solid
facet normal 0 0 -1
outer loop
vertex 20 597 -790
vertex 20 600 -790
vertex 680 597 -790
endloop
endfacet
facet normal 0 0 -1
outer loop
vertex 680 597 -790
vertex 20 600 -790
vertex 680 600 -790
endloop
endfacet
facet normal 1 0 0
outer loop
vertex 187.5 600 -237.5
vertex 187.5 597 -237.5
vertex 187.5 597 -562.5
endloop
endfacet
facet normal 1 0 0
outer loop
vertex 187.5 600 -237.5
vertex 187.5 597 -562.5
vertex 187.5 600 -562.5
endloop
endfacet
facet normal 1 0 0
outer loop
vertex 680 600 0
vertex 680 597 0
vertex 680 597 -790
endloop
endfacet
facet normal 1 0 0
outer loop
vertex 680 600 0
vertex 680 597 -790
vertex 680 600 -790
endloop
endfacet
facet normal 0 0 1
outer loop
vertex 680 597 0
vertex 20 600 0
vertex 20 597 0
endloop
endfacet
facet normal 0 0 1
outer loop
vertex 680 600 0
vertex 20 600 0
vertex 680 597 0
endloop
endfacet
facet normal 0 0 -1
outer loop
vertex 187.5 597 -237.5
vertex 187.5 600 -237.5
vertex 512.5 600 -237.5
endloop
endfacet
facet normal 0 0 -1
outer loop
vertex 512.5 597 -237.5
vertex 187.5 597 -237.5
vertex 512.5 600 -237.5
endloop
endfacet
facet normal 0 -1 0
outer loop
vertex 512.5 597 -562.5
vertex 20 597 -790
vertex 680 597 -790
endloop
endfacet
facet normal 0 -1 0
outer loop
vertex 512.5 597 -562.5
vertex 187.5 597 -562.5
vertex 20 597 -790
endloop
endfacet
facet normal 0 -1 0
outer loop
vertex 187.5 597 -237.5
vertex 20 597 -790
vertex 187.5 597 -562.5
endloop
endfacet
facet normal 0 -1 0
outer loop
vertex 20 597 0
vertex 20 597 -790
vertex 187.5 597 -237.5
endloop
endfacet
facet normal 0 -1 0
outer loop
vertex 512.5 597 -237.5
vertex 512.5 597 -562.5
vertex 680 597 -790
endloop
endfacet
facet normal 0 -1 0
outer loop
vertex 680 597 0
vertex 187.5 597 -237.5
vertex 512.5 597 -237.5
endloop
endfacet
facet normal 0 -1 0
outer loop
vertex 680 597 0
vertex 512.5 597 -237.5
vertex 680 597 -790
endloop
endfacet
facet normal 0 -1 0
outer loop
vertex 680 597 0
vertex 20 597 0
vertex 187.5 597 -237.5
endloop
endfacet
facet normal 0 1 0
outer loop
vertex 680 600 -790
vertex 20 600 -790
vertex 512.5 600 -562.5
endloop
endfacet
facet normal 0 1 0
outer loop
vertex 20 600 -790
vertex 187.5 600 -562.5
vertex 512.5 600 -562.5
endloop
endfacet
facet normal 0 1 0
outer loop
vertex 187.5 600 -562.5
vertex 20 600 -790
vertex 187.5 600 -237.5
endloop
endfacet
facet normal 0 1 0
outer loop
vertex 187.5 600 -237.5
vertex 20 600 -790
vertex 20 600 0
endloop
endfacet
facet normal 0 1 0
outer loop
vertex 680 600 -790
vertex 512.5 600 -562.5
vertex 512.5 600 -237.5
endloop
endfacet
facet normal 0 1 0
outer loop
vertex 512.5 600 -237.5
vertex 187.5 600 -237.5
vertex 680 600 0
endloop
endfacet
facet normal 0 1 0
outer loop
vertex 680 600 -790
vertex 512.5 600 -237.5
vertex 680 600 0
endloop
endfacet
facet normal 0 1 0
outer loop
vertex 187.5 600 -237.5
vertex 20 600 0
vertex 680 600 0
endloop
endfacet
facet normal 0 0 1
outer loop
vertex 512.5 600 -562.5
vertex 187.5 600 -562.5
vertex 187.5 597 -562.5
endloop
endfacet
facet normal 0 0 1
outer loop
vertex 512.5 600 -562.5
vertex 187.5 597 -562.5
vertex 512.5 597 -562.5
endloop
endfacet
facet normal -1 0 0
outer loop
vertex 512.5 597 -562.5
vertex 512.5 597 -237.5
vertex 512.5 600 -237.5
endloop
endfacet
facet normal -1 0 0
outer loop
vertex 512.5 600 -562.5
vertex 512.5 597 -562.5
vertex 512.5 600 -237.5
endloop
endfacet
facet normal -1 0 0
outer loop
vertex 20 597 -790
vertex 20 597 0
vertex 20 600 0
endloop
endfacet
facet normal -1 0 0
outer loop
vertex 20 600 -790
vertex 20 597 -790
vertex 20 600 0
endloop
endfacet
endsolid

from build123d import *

# Parameters (mm, degrees)
SKETCH1_W                            = 660
SKETCH1_H                            = 3
PACK_KALIP_PLAKASI_3MM_66X79_1_DEPTH = 790
PACK_KALIP_PLAKASI_3MM_66X79_2_START = -237.5
SKETCH2_W                            = 325
SKETCH2_H                            = 5
PACK_KALIP_PLAKASI_3MM_66X79_2_DEPTH = 325


with BuildPart() as part:
    # Sketch1 → PACK_kalip_plakasi_3mm_66x79_1 (new body)
    with BuildSketch(Plane.XY):
        with Locations((350, 598.5)):
            Rectangle(SKETCH1_W, SKETCH1_H)
    extrude(amount=-PACK_KALIP_PLAKASI_3MM_66X79_1_DEPTH)

    # Sketch2 → PACK_kalip_plakasi_3mm_66x79_2 (cut)
    with BuildSketch(Plane.XY.offset(PACK_KALIP_PLAKASI_3MM_66X79_2_START)):
        with Locations((350, 598.5)):
            Rectangle(SKETCH2_W, SKETCH2_H)
    extrude(amount=-PACK_KALIP_PLAKASI_3MM_66X79_2_DEPTH, mode=Mode.SUBTRACT)


solid = part.part
